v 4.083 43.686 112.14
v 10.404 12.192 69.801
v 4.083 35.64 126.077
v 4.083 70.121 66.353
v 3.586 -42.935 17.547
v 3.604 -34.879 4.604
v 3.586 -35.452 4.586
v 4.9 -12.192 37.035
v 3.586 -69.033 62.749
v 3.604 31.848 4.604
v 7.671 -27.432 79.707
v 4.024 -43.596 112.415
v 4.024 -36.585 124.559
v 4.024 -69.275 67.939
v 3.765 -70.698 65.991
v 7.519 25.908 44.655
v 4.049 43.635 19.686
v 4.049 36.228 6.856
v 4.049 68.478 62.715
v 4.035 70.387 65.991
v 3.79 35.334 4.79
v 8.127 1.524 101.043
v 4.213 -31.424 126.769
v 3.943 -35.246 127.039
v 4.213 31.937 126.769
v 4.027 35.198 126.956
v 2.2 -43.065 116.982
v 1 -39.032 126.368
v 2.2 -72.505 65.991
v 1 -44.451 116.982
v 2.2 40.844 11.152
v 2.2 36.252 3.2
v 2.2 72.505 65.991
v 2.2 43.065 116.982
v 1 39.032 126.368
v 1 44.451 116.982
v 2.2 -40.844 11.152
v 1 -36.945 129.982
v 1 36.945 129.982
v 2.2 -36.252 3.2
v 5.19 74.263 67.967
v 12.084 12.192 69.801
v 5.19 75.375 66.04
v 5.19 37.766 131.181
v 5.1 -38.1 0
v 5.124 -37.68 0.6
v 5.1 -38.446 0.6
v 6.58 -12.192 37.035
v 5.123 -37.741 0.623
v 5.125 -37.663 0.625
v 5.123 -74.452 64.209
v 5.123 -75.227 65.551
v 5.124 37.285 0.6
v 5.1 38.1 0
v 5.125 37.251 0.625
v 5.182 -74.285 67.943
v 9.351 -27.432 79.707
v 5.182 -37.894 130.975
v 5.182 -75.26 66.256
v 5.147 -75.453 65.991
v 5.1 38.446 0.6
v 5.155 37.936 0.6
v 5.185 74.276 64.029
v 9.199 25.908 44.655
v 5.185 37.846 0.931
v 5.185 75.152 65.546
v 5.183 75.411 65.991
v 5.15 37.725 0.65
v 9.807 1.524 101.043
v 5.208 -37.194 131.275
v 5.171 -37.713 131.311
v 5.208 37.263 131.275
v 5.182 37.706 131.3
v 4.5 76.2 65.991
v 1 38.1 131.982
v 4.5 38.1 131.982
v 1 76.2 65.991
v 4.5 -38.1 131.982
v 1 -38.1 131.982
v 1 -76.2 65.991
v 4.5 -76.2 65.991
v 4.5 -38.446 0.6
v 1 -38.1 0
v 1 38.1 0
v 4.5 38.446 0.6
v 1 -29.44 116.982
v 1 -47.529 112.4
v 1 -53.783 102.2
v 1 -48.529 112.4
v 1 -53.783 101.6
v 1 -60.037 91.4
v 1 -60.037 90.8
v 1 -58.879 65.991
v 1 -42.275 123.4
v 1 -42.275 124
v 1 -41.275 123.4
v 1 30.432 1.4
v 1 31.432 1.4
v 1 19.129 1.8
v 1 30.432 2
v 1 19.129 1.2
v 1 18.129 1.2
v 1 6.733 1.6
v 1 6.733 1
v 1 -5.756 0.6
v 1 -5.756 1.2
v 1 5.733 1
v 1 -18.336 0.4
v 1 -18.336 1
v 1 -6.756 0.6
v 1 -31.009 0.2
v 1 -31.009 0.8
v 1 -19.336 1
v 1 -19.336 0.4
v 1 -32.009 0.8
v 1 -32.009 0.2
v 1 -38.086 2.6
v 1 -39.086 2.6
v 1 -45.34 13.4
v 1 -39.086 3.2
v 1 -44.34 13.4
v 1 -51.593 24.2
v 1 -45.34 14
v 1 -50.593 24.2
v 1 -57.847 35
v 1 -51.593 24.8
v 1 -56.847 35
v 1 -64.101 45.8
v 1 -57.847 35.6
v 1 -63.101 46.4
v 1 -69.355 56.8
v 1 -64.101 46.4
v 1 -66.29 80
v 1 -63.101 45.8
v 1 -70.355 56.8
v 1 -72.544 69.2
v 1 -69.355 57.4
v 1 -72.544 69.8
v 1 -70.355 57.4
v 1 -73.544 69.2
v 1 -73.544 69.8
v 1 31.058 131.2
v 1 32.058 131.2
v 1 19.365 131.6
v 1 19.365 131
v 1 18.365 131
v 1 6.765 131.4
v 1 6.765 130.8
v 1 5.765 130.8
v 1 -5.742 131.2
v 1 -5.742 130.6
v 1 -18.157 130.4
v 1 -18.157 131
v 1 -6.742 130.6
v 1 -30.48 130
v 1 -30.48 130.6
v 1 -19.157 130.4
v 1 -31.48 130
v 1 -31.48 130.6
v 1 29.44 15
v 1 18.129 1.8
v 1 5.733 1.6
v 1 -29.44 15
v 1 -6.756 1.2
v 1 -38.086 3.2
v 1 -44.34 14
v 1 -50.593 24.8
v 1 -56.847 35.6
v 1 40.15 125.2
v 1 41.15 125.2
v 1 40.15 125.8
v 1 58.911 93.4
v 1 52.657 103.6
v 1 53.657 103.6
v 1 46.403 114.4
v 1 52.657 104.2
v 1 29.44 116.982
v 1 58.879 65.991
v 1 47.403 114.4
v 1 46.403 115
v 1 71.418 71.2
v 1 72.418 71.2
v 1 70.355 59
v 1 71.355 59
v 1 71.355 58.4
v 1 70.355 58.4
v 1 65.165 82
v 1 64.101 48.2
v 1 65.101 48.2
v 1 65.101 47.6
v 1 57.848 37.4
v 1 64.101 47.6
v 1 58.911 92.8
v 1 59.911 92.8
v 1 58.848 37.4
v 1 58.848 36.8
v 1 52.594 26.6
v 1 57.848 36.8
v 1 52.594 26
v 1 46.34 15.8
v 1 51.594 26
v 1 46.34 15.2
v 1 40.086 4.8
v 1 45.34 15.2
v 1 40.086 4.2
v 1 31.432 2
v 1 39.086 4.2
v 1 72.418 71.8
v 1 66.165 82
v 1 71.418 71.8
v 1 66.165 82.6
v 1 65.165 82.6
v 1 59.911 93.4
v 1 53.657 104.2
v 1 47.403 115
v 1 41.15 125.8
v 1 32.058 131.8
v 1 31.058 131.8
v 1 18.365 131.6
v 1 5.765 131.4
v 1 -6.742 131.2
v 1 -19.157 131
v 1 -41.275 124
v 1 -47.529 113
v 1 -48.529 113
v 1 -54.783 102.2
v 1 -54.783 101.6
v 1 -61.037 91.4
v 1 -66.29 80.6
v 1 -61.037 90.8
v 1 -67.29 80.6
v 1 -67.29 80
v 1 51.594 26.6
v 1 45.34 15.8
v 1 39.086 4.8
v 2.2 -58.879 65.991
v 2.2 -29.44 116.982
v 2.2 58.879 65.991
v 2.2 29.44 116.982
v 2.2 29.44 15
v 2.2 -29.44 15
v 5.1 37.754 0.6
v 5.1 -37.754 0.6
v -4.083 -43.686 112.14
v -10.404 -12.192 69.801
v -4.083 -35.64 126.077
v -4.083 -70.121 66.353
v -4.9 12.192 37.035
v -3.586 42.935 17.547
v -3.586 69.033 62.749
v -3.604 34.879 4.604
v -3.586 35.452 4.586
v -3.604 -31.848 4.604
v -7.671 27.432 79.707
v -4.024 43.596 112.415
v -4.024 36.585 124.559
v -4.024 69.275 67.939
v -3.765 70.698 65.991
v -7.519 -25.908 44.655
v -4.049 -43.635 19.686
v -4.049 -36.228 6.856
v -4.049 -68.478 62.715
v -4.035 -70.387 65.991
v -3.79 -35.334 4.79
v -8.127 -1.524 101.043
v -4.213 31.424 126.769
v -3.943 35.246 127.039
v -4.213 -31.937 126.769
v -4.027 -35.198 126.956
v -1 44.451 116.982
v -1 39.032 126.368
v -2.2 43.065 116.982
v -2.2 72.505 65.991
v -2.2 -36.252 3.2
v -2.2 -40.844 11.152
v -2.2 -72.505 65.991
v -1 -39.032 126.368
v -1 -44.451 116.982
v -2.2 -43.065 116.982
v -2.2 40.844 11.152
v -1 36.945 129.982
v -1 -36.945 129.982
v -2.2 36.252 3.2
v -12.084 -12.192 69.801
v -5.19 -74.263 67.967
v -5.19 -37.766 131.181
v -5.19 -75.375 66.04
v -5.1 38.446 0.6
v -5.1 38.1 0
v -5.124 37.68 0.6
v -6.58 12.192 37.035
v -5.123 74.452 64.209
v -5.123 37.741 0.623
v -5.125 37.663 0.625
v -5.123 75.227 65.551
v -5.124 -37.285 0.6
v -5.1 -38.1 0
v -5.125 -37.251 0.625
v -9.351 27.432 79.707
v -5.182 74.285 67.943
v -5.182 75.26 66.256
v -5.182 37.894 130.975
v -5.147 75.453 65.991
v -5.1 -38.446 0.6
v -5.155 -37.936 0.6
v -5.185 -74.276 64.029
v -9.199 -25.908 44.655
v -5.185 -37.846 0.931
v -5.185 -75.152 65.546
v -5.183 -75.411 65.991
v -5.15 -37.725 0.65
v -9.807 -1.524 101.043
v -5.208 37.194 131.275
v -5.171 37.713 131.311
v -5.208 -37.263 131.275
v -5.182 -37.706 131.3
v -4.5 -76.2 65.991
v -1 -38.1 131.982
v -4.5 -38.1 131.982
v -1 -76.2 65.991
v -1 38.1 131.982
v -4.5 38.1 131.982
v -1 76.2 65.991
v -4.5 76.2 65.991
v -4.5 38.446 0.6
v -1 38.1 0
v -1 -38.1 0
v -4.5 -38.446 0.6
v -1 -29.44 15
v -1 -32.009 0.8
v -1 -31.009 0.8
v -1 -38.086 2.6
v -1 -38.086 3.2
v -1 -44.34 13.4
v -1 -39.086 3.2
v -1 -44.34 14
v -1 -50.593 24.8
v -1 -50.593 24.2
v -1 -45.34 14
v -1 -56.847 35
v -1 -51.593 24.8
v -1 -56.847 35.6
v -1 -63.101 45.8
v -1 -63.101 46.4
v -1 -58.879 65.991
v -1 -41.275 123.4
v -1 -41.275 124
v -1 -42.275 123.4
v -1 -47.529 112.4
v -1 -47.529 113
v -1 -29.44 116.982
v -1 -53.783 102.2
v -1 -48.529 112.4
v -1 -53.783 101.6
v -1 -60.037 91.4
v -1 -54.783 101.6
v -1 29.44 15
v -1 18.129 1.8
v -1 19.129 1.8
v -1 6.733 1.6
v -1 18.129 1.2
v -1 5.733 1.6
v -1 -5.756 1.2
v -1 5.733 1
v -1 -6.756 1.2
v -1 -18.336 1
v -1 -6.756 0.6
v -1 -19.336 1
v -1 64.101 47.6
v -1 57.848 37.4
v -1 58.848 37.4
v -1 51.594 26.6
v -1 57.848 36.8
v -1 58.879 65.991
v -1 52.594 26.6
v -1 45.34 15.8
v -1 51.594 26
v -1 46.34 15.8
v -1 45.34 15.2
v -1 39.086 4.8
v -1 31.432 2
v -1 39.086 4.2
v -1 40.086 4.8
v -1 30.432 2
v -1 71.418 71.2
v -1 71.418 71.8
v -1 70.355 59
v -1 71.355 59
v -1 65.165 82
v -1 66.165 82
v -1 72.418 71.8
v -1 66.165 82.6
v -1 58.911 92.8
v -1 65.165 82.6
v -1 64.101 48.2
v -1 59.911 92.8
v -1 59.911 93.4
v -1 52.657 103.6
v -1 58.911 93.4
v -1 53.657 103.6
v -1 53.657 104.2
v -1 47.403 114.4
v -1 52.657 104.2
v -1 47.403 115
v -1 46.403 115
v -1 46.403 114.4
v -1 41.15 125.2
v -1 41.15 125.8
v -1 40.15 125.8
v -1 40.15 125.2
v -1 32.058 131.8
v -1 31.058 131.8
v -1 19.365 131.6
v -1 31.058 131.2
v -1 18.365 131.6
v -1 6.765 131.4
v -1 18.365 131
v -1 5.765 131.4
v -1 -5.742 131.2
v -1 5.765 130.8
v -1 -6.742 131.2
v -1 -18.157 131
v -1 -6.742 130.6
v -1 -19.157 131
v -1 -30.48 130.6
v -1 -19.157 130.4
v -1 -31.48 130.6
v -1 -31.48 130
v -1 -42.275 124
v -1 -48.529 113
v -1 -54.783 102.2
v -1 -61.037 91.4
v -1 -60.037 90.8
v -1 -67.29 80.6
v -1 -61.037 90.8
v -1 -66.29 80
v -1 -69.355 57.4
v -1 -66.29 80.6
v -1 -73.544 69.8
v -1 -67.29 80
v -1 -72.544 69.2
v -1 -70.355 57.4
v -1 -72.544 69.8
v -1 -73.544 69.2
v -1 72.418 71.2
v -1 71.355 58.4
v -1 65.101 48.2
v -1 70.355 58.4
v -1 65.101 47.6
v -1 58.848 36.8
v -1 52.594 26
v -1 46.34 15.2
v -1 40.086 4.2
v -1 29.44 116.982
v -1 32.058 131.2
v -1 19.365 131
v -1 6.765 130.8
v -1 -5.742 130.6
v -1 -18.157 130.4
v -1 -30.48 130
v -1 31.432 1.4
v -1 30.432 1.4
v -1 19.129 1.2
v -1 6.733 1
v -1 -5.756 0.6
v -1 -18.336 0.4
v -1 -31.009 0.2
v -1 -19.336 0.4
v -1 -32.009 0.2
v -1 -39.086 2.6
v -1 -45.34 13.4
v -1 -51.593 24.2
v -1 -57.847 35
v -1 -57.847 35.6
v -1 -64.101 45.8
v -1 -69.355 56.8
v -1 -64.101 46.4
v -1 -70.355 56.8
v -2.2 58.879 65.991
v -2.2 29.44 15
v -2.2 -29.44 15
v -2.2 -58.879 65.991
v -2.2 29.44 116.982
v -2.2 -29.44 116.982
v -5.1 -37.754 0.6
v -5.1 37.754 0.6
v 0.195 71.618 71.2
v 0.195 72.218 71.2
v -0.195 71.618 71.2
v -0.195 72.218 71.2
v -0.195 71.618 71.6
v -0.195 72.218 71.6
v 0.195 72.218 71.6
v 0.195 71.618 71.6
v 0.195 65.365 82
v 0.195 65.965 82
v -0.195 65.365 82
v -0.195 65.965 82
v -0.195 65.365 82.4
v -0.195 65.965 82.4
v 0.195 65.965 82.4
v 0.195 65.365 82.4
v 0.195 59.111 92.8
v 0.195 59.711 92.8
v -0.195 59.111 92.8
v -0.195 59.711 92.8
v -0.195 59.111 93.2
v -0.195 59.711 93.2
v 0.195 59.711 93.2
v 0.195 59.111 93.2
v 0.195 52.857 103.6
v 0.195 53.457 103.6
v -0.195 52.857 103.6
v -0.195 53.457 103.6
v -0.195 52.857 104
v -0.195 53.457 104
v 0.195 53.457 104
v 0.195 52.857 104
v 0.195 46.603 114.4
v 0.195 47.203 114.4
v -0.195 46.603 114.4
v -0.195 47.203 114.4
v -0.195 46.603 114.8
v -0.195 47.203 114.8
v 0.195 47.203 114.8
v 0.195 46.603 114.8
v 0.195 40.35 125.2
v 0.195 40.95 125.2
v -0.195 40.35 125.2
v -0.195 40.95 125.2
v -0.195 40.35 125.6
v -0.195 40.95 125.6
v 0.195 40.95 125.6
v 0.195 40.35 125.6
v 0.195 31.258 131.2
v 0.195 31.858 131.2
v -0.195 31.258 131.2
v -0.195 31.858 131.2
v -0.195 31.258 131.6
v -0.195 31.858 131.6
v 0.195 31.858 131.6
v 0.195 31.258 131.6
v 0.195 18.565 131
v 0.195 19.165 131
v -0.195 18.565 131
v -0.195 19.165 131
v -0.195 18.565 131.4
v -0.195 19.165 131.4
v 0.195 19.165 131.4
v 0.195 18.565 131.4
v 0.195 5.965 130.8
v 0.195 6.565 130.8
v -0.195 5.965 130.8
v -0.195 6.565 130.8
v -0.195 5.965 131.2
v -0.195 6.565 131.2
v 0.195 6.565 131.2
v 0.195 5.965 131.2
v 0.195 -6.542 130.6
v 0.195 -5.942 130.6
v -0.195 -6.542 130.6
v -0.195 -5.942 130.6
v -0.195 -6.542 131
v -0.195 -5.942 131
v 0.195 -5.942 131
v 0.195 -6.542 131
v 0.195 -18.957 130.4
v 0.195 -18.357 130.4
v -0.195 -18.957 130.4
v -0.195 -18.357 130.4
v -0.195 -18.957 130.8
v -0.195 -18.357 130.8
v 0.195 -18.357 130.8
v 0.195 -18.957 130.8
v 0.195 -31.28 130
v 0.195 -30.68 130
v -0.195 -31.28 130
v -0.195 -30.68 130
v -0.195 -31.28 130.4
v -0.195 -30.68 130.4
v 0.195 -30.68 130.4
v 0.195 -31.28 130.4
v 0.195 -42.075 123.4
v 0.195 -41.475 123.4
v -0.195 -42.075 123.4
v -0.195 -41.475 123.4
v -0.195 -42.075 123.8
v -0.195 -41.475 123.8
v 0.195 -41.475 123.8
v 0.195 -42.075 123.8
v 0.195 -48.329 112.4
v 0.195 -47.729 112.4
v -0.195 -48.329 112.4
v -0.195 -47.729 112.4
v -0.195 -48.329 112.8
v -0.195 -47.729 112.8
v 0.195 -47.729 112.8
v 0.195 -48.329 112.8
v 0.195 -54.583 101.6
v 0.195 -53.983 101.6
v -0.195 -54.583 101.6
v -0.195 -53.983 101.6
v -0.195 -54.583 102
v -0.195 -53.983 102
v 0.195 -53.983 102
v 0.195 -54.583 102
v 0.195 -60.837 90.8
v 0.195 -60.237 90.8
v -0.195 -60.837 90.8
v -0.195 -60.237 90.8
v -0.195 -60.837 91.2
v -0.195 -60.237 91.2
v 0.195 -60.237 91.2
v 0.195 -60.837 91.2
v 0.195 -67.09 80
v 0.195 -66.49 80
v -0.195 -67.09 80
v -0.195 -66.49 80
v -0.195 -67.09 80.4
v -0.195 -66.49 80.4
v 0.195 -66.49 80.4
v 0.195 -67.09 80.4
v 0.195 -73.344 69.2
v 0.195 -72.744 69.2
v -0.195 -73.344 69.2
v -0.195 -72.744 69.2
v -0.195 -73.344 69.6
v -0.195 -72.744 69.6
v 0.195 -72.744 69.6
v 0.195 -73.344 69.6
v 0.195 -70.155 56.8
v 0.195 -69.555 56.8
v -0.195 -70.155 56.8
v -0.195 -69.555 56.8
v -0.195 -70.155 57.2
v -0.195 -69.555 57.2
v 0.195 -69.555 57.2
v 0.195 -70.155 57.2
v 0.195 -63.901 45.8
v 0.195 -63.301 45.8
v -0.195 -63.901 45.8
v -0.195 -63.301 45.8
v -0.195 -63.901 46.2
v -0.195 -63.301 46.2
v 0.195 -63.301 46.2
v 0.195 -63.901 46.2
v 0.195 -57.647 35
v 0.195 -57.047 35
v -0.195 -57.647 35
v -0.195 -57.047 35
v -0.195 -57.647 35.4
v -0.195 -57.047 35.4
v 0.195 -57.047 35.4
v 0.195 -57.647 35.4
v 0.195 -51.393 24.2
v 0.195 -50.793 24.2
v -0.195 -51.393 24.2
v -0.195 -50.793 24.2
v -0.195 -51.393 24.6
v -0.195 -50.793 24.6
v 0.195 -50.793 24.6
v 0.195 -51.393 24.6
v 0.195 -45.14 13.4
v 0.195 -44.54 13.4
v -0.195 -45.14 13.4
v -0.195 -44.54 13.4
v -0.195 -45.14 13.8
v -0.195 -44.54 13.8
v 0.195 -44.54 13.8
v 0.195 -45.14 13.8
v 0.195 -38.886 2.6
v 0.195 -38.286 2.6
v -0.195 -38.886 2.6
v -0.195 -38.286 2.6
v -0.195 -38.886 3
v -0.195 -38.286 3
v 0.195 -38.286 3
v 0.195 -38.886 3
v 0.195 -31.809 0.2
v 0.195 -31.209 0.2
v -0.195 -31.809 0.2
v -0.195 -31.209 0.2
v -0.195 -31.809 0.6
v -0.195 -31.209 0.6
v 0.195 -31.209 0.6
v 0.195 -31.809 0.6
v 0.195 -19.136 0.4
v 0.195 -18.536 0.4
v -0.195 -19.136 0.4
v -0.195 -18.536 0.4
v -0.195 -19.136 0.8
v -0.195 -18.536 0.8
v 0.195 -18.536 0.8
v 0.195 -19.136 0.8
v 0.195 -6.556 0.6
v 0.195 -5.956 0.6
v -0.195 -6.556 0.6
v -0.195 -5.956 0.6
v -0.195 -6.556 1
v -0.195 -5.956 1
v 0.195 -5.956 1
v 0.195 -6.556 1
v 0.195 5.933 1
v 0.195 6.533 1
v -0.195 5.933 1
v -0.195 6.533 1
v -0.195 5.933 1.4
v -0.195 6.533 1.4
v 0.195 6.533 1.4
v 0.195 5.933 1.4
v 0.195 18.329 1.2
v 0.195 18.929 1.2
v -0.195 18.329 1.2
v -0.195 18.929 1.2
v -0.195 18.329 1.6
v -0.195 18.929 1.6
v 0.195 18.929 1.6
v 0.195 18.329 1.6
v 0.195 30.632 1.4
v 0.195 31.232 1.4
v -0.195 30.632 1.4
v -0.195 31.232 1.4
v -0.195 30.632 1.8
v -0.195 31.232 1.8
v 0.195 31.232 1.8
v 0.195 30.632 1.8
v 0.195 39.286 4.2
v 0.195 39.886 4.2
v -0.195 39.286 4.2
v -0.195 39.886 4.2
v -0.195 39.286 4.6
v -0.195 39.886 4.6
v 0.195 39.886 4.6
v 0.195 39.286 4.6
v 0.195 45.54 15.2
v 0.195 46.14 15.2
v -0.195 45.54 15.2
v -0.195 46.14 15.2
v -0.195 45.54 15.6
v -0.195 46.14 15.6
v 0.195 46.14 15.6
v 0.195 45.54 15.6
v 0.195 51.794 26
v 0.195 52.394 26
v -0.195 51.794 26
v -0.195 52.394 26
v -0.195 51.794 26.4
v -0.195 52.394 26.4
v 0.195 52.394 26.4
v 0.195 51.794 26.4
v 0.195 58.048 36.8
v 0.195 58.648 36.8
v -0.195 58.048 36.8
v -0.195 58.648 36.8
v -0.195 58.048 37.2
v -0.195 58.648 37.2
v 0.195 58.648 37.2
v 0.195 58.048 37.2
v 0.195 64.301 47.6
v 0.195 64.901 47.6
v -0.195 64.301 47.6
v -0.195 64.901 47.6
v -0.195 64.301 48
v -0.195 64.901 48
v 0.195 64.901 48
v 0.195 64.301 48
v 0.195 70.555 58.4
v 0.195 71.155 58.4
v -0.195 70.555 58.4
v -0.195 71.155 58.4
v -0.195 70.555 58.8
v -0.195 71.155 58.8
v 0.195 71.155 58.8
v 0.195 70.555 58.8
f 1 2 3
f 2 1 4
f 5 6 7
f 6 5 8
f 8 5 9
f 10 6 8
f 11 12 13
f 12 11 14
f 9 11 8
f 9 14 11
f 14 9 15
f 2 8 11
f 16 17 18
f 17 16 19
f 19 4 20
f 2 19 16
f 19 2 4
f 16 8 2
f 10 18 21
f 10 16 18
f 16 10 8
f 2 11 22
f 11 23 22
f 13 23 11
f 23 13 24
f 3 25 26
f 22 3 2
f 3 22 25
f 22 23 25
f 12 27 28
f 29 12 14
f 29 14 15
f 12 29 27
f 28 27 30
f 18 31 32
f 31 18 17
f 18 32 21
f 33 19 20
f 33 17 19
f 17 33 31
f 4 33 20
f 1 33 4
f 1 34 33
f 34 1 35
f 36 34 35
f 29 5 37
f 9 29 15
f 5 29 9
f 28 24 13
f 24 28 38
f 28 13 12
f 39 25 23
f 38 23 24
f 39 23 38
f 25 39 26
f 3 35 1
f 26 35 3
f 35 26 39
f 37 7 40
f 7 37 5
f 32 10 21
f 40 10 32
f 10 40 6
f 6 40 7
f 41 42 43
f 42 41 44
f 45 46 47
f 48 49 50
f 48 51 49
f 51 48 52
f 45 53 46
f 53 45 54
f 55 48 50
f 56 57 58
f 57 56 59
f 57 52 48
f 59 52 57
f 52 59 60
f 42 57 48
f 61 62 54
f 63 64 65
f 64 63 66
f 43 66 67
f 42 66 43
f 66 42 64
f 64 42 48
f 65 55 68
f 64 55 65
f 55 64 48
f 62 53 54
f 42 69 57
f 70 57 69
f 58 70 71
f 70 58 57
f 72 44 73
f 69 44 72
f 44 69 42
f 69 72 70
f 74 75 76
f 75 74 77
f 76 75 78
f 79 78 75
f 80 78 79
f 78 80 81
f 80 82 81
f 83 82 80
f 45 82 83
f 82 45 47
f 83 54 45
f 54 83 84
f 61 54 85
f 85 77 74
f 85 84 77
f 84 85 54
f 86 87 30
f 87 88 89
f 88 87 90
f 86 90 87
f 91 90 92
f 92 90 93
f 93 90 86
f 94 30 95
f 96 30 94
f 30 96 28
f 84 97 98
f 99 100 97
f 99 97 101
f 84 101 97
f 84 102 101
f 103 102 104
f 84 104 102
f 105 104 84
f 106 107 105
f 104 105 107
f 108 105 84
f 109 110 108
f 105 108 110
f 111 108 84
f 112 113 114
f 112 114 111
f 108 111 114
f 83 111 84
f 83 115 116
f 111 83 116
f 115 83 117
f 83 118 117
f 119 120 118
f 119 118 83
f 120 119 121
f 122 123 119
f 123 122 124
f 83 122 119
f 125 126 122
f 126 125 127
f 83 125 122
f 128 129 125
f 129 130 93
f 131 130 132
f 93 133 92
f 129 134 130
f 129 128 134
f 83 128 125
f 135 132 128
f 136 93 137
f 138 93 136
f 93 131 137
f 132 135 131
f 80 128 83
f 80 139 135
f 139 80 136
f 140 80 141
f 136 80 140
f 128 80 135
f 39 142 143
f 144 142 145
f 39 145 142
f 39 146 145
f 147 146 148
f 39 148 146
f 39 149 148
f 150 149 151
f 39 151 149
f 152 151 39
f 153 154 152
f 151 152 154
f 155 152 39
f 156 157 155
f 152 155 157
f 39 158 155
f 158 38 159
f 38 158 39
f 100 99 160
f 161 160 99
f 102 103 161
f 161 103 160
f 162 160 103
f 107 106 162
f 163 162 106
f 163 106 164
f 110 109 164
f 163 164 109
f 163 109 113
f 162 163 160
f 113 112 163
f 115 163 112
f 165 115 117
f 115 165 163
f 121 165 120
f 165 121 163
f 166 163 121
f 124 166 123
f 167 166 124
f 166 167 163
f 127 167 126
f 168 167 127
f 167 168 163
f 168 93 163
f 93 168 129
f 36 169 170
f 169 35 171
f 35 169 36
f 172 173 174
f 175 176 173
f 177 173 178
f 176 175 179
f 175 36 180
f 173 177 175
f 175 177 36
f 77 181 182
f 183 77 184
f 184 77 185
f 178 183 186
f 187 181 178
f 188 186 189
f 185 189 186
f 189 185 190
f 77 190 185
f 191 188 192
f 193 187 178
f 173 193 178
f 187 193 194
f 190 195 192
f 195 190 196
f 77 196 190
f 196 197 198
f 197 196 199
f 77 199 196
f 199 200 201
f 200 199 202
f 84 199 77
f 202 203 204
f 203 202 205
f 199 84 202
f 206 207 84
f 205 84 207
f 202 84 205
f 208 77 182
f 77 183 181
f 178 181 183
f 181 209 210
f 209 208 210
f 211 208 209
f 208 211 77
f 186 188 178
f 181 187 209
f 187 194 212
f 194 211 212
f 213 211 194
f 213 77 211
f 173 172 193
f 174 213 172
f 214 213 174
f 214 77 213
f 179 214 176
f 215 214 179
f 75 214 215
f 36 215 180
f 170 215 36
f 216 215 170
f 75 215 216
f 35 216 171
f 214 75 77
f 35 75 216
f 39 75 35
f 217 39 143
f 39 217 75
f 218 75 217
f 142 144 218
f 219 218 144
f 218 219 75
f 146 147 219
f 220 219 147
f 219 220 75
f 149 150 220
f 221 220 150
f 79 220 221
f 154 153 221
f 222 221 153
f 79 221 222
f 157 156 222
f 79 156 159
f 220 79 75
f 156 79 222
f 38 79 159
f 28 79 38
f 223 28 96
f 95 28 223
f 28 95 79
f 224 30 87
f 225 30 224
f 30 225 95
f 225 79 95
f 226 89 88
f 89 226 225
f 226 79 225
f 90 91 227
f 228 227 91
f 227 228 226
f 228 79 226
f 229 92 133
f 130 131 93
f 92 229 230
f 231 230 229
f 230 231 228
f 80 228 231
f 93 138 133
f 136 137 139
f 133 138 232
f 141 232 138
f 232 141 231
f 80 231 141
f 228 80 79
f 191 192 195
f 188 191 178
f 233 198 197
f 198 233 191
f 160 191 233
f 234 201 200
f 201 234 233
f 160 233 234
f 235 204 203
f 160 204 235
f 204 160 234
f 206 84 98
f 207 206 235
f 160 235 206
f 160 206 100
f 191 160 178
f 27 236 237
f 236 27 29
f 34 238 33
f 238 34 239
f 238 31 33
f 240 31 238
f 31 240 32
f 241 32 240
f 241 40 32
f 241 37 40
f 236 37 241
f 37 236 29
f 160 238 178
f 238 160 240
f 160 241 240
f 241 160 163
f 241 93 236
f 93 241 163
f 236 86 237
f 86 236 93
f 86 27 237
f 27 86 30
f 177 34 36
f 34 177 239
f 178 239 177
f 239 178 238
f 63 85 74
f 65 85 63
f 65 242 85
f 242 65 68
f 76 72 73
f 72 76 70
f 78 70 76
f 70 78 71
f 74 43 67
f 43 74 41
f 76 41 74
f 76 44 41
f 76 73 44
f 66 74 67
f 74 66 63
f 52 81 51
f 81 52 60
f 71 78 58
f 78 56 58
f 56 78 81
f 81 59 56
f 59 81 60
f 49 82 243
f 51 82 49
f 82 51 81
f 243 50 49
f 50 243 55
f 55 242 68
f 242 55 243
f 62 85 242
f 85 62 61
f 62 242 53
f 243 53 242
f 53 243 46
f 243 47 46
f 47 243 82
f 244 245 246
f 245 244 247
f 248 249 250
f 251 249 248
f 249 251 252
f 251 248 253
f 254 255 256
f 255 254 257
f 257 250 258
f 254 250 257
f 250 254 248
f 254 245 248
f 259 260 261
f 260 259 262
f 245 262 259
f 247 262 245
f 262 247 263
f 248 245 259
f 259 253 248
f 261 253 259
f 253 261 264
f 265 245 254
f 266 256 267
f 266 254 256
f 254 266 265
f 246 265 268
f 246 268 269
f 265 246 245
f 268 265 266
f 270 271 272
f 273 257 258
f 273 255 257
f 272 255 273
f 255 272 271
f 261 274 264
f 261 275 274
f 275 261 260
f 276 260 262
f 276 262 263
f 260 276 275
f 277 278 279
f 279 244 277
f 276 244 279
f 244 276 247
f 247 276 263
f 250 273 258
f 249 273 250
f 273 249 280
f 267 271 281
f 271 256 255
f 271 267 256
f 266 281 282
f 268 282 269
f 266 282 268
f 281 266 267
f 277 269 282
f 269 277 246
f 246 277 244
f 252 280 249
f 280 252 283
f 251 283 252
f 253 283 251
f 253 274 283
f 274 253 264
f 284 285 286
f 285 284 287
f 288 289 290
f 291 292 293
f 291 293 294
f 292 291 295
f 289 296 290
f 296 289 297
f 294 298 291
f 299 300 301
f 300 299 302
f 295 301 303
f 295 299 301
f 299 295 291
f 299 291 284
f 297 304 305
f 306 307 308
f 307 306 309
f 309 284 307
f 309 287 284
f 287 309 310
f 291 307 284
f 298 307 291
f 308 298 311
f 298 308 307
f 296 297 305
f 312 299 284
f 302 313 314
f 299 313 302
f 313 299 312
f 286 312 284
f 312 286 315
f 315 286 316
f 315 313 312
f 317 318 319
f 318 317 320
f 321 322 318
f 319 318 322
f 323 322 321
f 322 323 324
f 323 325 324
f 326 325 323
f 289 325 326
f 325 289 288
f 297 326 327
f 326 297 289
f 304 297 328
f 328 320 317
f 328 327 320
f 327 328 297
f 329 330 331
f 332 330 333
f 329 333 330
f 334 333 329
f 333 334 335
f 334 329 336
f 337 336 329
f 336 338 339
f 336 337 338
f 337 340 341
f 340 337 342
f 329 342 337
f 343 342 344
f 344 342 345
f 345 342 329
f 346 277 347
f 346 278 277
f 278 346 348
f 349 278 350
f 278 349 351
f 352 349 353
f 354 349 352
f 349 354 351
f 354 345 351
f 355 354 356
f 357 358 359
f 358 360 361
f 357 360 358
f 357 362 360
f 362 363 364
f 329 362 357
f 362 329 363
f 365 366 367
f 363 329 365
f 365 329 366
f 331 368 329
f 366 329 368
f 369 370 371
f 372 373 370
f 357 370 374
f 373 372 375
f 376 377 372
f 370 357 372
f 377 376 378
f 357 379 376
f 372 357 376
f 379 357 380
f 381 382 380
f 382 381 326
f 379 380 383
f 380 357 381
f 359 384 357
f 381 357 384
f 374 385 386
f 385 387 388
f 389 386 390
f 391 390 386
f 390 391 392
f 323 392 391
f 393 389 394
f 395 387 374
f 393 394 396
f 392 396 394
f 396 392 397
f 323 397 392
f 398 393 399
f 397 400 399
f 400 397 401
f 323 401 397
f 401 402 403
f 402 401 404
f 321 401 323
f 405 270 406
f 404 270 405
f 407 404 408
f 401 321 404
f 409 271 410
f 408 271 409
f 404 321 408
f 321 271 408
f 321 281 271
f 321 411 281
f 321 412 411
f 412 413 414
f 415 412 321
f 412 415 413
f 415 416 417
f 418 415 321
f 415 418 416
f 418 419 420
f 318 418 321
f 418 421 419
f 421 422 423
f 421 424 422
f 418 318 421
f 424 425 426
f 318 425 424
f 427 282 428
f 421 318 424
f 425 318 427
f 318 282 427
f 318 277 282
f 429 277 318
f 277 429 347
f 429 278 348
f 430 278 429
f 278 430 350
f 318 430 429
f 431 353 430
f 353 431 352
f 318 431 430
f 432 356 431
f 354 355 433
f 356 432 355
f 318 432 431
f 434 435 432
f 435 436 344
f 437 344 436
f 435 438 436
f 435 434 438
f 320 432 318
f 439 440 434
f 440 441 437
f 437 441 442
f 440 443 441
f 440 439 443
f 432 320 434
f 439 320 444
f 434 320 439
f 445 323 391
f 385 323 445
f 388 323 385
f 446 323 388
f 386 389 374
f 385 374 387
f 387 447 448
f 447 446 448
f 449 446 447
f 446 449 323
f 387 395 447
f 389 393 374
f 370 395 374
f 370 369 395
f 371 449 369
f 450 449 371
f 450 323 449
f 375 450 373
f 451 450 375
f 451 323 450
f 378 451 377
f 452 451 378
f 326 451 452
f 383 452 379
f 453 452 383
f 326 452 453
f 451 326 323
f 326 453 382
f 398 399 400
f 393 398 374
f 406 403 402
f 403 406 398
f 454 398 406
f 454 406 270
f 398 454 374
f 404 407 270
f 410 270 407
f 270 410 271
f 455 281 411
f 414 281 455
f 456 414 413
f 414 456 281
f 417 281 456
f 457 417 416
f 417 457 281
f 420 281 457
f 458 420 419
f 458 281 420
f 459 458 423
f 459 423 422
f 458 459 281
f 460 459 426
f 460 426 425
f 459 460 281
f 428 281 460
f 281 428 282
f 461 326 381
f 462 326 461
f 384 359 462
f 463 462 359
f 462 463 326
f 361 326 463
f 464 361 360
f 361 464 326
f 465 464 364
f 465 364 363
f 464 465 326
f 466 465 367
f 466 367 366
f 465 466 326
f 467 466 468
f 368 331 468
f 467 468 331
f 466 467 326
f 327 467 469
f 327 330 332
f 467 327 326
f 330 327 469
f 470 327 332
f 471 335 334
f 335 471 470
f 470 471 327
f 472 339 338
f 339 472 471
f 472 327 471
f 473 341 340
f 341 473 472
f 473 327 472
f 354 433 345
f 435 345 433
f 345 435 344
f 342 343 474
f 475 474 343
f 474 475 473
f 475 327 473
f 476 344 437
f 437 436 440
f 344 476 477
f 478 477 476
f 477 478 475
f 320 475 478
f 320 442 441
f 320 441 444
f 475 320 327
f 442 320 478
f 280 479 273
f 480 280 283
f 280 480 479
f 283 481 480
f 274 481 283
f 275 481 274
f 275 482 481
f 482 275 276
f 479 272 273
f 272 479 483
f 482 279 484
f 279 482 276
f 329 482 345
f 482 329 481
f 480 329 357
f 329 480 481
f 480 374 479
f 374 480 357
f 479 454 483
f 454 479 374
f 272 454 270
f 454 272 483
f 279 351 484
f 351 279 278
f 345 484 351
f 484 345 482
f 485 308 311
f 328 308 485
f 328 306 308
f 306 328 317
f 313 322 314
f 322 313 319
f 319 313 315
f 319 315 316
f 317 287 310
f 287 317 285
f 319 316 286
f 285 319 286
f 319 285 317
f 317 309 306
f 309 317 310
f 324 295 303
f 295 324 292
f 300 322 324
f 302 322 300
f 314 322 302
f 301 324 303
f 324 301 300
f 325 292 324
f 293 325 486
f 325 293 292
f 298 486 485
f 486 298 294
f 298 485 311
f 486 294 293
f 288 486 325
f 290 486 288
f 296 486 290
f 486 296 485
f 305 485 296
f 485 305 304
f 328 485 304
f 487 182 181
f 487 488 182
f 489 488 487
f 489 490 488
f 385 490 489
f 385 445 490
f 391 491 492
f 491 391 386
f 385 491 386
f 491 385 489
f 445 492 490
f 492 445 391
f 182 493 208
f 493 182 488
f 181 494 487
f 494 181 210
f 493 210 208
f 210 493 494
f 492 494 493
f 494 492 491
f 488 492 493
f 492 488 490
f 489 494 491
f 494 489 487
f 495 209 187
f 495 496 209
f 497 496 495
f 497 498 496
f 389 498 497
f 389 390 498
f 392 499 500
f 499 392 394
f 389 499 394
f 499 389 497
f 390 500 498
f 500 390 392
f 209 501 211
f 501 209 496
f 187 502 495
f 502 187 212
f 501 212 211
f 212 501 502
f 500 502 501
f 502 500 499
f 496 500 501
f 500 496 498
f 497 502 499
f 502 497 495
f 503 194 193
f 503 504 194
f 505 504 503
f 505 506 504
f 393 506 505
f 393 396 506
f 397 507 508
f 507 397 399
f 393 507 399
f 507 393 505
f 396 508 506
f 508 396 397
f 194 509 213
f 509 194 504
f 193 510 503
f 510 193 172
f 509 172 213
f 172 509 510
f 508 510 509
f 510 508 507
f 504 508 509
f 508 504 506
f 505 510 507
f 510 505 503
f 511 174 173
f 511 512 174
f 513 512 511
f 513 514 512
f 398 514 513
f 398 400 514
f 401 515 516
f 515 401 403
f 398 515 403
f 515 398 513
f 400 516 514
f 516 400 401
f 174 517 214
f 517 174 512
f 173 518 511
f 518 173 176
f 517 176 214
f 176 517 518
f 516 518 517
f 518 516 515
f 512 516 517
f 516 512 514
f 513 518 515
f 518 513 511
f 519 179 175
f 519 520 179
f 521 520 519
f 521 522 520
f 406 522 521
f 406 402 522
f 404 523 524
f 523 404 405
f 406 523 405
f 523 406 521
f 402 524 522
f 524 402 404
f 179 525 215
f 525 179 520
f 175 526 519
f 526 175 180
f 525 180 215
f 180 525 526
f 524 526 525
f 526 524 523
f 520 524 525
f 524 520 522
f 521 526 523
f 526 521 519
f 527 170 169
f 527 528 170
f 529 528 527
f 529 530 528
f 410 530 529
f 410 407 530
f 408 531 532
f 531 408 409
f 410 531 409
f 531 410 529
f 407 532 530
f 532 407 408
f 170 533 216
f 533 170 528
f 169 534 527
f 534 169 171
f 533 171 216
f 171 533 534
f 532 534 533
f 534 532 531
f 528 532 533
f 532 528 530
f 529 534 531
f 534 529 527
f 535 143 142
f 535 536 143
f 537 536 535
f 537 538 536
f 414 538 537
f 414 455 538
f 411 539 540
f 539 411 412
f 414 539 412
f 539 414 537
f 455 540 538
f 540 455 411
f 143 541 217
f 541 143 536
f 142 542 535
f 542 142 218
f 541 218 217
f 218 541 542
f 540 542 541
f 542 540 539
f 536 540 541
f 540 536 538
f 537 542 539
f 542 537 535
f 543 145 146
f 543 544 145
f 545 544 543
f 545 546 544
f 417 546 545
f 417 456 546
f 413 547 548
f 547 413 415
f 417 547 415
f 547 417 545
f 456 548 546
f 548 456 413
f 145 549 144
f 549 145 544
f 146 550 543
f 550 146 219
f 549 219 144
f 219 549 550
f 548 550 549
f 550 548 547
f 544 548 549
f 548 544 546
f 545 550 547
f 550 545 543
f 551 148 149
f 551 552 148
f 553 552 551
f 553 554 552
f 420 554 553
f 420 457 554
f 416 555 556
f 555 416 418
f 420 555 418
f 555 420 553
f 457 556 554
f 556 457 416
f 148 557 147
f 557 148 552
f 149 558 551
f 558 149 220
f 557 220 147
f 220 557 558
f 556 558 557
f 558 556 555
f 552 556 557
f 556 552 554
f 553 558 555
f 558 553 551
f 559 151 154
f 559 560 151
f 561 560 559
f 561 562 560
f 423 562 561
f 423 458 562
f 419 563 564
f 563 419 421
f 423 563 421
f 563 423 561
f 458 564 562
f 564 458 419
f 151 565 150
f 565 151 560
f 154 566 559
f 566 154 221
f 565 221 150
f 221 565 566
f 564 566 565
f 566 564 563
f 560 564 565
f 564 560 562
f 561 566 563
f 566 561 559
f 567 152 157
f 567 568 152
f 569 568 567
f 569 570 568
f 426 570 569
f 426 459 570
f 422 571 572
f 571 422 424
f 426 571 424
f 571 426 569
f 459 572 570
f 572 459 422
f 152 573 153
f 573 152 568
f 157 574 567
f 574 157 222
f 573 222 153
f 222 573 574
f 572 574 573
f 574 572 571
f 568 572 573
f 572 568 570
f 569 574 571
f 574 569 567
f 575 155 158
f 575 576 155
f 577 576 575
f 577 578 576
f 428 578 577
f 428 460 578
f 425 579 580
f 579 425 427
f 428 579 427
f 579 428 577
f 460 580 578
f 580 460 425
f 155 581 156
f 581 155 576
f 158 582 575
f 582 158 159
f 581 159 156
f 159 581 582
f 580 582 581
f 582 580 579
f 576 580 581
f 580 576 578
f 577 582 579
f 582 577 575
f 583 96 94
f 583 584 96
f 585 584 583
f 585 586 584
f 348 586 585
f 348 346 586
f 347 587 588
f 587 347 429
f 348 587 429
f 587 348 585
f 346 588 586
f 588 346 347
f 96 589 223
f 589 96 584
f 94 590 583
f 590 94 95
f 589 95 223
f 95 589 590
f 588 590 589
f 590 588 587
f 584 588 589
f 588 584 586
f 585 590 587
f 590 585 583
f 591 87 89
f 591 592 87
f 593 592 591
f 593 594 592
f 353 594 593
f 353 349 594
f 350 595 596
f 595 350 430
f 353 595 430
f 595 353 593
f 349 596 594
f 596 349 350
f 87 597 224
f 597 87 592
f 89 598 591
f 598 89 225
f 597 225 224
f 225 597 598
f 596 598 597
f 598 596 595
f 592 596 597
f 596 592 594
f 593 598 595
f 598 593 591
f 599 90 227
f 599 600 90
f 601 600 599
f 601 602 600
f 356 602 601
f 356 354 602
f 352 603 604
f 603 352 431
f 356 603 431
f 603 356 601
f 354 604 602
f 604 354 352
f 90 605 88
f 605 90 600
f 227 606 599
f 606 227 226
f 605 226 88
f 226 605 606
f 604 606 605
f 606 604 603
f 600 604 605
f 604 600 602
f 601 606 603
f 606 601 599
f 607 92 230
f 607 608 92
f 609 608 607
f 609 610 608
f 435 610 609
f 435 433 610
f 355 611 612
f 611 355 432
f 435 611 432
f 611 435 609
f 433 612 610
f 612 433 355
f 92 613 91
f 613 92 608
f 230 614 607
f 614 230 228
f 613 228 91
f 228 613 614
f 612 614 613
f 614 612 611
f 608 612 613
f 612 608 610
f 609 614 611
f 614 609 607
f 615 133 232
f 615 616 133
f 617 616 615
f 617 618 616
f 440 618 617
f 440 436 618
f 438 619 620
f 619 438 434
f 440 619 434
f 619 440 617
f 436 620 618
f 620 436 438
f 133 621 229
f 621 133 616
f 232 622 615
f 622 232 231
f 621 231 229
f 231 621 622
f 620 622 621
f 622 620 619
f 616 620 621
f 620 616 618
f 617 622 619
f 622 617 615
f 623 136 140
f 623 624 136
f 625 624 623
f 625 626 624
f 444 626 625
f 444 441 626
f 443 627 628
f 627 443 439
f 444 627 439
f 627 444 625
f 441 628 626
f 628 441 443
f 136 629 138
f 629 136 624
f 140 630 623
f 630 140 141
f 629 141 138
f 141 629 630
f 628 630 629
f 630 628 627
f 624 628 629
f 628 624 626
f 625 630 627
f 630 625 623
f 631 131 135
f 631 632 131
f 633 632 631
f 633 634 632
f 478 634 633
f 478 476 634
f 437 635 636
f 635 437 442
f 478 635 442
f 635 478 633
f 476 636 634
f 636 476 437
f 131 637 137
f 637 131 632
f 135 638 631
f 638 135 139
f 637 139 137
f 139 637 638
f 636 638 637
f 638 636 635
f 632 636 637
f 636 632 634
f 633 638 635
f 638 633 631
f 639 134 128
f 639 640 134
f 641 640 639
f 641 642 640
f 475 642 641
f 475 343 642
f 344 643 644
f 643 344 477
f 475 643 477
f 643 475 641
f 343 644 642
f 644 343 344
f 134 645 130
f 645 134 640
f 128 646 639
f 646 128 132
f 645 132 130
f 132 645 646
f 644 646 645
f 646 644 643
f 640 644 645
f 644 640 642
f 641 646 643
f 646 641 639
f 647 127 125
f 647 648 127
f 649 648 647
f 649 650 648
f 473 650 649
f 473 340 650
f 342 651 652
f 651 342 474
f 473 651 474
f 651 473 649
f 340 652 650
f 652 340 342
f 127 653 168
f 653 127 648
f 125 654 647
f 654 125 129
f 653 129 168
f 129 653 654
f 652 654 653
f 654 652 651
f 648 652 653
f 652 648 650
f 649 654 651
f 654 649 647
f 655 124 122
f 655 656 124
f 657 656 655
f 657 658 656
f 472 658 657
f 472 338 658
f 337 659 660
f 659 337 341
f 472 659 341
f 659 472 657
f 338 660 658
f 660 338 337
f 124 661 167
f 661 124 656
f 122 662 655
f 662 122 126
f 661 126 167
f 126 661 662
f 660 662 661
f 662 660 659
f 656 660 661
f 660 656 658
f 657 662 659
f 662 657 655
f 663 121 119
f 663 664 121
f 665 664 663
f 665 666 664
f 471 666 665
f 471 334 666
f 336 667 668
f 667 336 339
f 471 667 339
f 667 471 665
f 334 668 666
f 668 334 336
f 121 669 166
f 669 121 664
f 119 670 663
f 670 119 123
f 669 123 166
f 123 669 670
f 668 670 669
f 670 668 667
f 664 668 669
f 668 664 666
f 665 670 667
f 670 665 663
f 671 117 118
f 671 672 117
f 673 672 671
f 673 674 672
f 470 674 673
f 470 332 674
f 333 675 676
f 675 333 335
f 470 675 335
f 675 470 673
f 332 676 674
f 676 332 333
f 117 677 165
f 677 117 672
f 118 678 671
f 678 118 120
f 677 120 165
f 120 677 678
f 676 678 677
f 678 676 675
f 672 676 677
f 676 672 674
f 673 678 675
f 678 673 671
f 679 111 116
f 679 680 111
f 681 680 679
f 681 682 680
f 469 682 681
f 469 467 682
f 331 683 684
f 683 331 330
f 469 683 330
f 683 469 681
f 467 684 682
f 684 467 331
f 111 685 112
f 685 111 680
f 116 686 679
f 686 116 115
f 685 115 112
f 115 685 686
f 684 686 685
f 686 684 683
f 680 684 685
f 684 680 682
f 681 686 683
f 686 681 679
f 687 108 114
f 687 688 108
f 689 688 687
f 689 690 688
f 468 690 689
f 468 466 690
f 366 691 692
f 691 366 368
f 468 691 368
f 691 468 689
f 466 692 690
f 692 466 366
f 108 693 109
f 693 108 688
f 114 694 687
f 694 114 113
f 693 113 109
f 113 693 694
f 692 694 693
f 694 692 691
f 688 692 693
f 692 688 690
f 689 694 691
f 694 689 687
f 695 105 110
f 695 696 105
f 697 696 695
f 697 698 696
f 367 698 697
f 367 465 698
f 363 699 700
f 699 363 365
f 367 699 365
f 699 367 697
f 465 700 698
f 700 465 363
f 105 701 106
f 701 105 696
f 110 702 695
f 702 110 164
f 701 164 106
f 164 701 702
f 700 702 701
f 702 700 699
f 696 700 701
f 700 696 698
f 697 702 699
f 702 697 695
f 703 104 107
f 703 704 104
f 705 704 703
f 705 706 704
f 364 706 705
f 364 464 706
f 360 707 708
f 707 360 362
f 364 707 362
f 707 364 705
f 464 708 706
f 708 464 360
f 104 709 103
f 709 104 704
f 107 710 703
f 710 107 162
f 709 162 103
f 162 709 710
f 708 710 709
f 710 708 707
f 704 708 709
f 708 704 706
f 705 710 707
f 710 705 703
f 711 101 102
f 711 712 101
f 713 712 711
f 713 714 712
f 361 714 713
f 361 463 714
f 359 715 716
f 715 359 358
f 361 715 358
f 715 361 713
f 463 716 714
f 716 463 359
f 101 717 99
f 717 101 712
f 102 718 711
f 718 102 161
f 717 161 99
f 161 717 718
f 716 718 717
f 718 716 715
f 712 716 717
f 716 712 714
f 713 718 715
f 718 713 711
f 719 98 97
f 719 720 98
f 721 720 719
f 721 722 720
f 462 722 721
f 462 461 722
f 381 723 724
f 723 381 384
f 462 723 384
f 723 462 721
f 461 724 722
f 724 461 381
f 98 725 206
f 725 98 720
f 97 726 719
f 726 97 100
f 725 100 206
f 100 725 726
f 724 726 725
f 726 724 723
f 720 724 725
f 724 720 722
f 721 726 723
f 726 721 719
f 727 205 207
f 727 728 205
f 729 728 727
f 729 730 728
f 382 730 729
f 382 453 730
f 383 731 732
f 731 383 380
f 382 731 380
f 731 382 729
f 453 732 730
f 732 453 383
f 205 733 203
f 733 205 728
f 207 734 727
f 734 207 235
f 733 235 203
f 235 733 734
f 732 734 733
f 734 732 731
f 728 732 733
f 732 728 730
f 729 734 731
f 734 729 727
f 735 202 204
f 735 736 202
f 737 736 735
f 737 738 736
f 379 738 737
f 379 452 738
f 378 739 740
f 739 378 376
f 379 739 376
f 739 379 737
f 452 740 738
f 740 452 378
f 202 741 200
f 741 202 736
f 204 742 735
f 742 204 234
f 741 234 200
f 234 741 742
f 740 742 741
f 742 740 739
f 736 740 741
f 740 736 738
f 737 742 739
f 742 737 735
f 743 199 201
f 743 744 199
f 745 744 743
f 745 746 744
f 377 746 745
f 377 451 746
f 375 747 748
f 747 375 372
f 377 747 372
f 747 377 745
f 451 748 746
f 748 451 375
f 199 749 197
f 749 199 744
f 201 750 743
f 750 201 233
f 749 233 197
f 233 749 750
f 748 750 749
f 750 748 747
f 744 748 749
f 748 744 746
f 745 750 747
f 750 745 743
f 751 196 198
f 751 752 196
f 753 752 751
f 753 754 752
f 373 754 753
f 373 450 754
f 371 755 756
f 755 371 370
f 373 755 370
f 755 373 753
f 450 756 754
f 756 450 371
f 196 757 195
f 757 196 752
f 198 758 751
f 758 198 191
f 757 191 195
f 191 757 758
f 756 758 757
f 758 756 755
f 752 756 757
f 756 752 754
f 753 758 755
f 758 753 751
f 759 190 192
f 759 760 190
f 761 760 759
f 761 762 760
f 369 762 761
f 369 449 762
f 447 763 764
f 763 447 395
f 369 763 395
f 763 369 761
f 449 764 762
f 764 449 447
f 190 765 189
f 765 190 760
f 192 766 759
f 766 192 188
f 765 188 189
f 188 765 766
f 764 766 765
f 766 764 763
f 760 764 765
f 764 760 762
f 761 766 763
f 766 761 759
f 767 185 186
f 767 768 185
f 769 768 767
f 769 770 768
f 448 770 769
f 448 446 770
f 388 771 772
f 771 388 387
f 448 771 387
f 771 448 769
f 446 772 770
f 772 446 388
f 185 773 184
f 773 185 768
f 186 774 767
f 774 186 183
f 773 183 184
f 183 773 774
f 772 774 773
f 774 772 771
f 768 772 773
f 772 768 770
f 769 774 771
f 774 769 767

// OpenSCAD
/* HEX TILE v75 — reviewed native parametric OpenSCAD; millimetres.
   Standalone: no imports, missing modules, embedded STL or fused base rail.
   Default is ONE 6-inch candidate pair. 'chain' lays out independent pairs.
   F5 = preview. F6 = render; then File > Export > STL.
   Cut center necks before separating. Do not twist, peel or pry tile faces.
   Geometry checks cannot certify clean release, finish or print stability.
   OpenSCAD 2026.10.11 + Manifold tested; slicer remains authoritative.
*/

/* [Output] */
output = "pair"; // [pair, chain, wall, flat, separated, tabs, section, release_test]
inspection_spacing = 18;
show_markers = false; // Preview only; excluded from exported geometry.

/* [Tile geometry] */
size_in = 6;
edge_depth = 4.1;
rim = 2.0;
skin = 1.68; // v73: was 1.2 (v70–v72); 1.7 trips the clearance assert by float rounding. Vertical offset of faceted surface; not normal wall thickness.
relief_scale = 1.0;
front_chamfer = 0.6; // v73: back to v70 (v72 had 0.15, chip-prone edge).
// v74: leave the bed edge square. v73's 0.6 chamfer there undercut the first layer
// (9.0 mm footprint vs 10.4 mm just above); four upright prints tore off above the brim.
chamfer_bed_edge = false;
back_edge_chamfer = 0; // Maximize flat mounting surface; optional small bevel.
/* [Open back and wall-mounting flange] */
back_ring_width = 15;    // Wide enough for ~1/2 in (12.7 mm) foam tape with placement margin.
back_ring_t = 1.2;

// Keep the broad horizontal top flange omitted for upright printing.
// The other five continuous flange segments remain supported as they grow.
include_top_flange = false;
minimum_front_clearance = 1.2;

/* [Cuttable connections] */
pair_gap = 2.0;
root_width = 1.0;
root_height = 0.6;
root_overlap = 0.30; // Embed into flange, not a prediction of residual stub height.
neck_width = 0.60;
neck_height = 0.40;
neck_length = 0.40;
tab_pitch = 13; // v75: was 12 (7 tacks/side, 42/pair); 13 gives 6/side, 36/pair. Owner: "hard to seperate".

/* [Layer checks — match slicer] */
layer_height = 0.20;
first_layer_height = 0.20;
line_width = 0.42; // Check only; SCAD cannot set slicer extrusion width/nozzle.
enforce_event_limits = true;
root_event_limit = 2;       // Per-pair root transition cap.
all_event_limit = 3;        // Per-pair root + neck transition cap.

// Preserve the proven v70 three-pair chain while making its aggregate
// transition budget explicit. Lower these if slicer testing supports it.
enforce_batch_event_limits = true;
batch_root_event_limit = 6;
batch_all_event_limit = 9;

/* [Batch and bed — conservative rectangular check] */
chain_count = 3;
chain_gap = 6;
bed_width = 256;
bed_depth = 256;
bed_height = 256;
planned_brim = 10; // Used only in fit check; set brim separately in the slicer.
bed_margin = 5;

/* [Release sample — real lower rim, flange and front skin] */
sample_width = 24;
sample_height = 18;
sample_spacing = 10;

/* [Hidden] */
eps = 0.01;
R = size_in*25.4/2;
AP = R*cos(30);
relief_max = 0.091654*R*relief_scale;
front_max = edge_depth+relief_max;
D = front_max+1;
pair_width = 2*front_max+pair_gap;
N = max(2,ceil(R/tab_pitch));
lo = root_height/2+0.10;
hi = rim-root_height/2;
phase = [0,0,0.18,0.33,0,-0.17];
joined_mode = output=="pair" || output=="chain" || output=="section";
uses_tabs = joined_mode || output=="tabs";
integer_tolerance = 0.0001;

function dot2(a,b) = a[0]*b[0]+a[1]*b[1];
function lerp(a,b,t) = a+(b-a)*t;
function integer_value(x) = abs(x-round(x))<integer_tolerance;

function hex_point(s,inset) =
    let(rr=(AP-inset)/cos(30))
    [rr*cos(60*s),rr*sin(60*s)];

function inset_at(s,i) =
    s==1 ? lerp(lo,hi-0.1,i/(N-1)) :
    s==4 ? lerp(lo+0.1,hi,i/(N-1)) :
    rim/2;

function raw_center(s,i) =
    let(ins=inset_at(s,i),t=(i+0.5+phase[s])/N)
    lerp(hex_point(s,ins),hex_point(s+1,ins),t);

// Root bottom snaps to a BED-ALIGNED layer boundary.
// Its width coordinate remains unchanged.
function bed_layer_index(z) =
    floor((z-first_layer_height)/layer_height+0.5);

function layer_boundary(k) =
    first_layer_height+k*layer_height;

function tab_center(s,i) =
    let(
        p=raw_center(s,i),
        k=bed_layer_index(p[1]+AP-root_height/2)
    )
    [p[0],layer_boundary(k)+root_height/2-AP];

centers = [
    for(s=[0:5],i=[0:N-1])
        tab_center(s,i)
];

function root_bottom_layer(p) =
    bed_layer_index(p[1]+AP-root_height/2);

root_layers = round(root_height/layer_height);
neck_layers = round(neck_height/layer_height);

root_events = [
    for(p=centers,d=[0,root_layers])
        root_bottom_layer(p)+d
];

// Count each distinct transition once per join:
// root start, neck end, root end.
all_events =
    neck_layers==root_layers
    ? root_events
    : [
        for(p=centers,d=[0,neck_layers,root_layers])
            root_bottom_layer(p)+d
    ];

function event_peak(events) =
    max([
        for(k=events)
            len([for(e=events) if(e==k) 1])
    ]);

root_peak = event_peak(root_events);
all_peak = event_peak(all_events);

// For chain output, all independent pairs are aligned and therefore
// transition on the same bed layers. Enforce limits against the full batch.
effective_root_peak = output=="chain" ? root_peak*chain_count : root_peak;
effective_all_peak = output=="chain" ? all_peak*chain_count : all_peak;

within_side_pitch = max([
    for(s=[0:5],i=[0:N-2])
        norm(tab_center(s,i+1)-tab_center(s,i))
]);

corner_pitch = max([
    for(s=[0:5])
        norm(tab_center((s+1)%6,0)-tab_center(s,N-1))
]);

actual_pitch = max(within_side_pitch,corner_pitch);

function rim_distance(p) =
    AP-max([
        for(s=[0:5])
            dot2(p,[cos(30+60*s),sin(30+60*s)])
    ]);

root_corners = [
    for(p=centers,dy=[-1,1],dz=[-1,1])
        p+[dy*root_width/2,dz*root_height/2]
];

root_outer_margin =
    min([for(p=root_corners) rim_distance(p)]);

root_inner_distance =
    max([for(p=root_corners) rim_distance(p)]);

/* Dimension and topology guards */

assert(
    size_in>=3 && size_in<=10,
    "Size must be 3–10 inches"
);

assert(
    edge_depth>0 && skin>0 && relief_scale>0,
    "Invalid body dimensions"
);

assert(
    rim>=1.5 && rim<AP/4,
    "Rim outside supported range"
);

assert(
    back_ring_t>0 &&
    back_ring_width>=0 &&
    back_ring_width<=AP/2,
    "Invalid flange"
);
assert(
    edge_depth-skin-back_ring_t>=minimum_front_clearance,
    "Flange too close to front skin"
);

assert(
    minimum_front_clearance>0,
    "Front clearance must be positive"
);

assert(
    front_chamfer>=0 &&
    front_chamfer<min(rim,edge_depth),
    "Invalid front chamfer"
);

assert(
    back_edge_chamfer>=0 &&
    back_edge_chamfer<min(rim,back_ring_t),
    "Invalid back bevel"
);

assert(
    layer_height>0 &&
    first_layer_height>0 &&
    line_width>0,
    "Invalid slicer check values"
);

assert(
    pair_gap>=1.5 && pair_gap<=3,
    "Pair gap must be 1.5–3 mm"
);

assert(
    root_height>0 &&
    root_height<=1 &&
    root_width>neck_width &&
    root_width<=1.2,
    "Invalid root"
);

assert(
    neck_width>=line_width &&
    neck_height>=layer_height &&
    neck_height<=root_height,
    "Unprintable neck dimensions"
);

assert(
    neck_length>0 && neck_length<pair_gap,
    "Neck must fit in gap"
);

assert(
    root_overlap>0 && root_overlap<back_ring_t,
    "Root overlap must fit flange thickness"
);

assert(
    integer_value(root_height/layer_height) &&
    integer_value(neck_height/layer_height),
    "Root/neck heights must be whole layers"
);

assert(
    tab_pitch>0 && hi>lo+0.1,
    "Invalid tab spacing or rim allowance"
);

assert(
    !uses_tabs || actual_pitch<=tab_pitch,
    "Actual tab spacing exceeds requested pitch"
);

assert(
    !uses_tabs ||
    (
        root_outer_margin>eps &&
        root_inner_distance<=rim+eps
    ),
    "A root extends outside the supported rim; revise dimensions"
);

assert(
    !joined_mode || back_ring_width>=rim,
    "Joined outputs require a supporting tape flange"
);

assert(
    !uses_tabs ||
    !enforce_event_limits ||
    (
        root_peak<=root_event_limit &&
        all_peak<=all_event_limit
    ),
    "Per-pair layer transition burst: adjust layout or deliberately revise limits"
);

assert(
    output!="chain" ||
    !enforce_batch_event_limits ||
    (
        effective_root_peak<=batch_root_event_limit &&
        effective_all_peak<=batch_all_event_limit
    ),
    "Whole-chain layer transition burst: reduce chain count or revise batch limits deliberately"
);

assert(
    integer_value(chain_count) &&
    chain_count>=1 &&
    chain_count<=8,
    "Batch count must be integer 1–8"
);

assert(
    chain_gap>0 && inspection_spacing>=0,
    "Invalid spacing"
);

assert(
    output!="release_test" ||
    (
        sample_width>=root_width+4 &&
        sample_width<R &&
        sample_height>8 &&
        sample_height<AP/2
    ),
    "Invalid sample dimensions"
);

assert(
    back_ring_width>=4 || output!="release_test",
    "Sample needs at least 4 mm tape flange"
);

assert(
    planned_brim>=0 &&
    bed_margin>=0 &&
    min(bed_width,bed_depth,bed_height)>0,
    "Invalid bed check"
);

assert(
    output=="pair" ||
    output=="chain" ||
    output=="wall" ||
    output=="flat" ||
    output=="separated" ||
    output=="tabs" ||
    output=="section" ||
    output=="release_test",
    "Unknown output"
);

/* Conservative layout bounds.
   Includes planned brim and margins.
   Does not model printer exclusion zones. */

layout_x =
    output=="chain"
        ? chain_count*pair_width+(chain_count-1)*chain_gap :
    output=="release_test"
        ? 3*pair_width+2*sample_spacing :
    output=="flat"
        ? 2*R :
    output=="wall"
        ? front_max :
    output=="separated"
        ? pair_width+inspection_spacing :
    pair_width;

layout_y =
    output=="release_test"
        ? sample_width :
    output=="flat"
        ? 2*AP :
    2*R;

layout_z =
    output=="release_test"
        ? sample_height :
    output=="flat"
        ? front_max :
    2*AP;

print_layout =
    output=="pair" ||
    output=="chain" ||
    output=="wall" ||
    output=="flat" ||
    output=="separated" ||
    output=="tabs" ||
    output=="section" ||
    output=="release_test";

assert(
    !print_layout ||
    (
        layout_x+2*(planned_brim+bed_margin)<=bed_width &&
        layout_y+2*(planned_brim+bed_margin)<=bed_depth &&
        layout_z<=bed_height
    ),
    "Layout plus brim/margin exceeds bed; resize or reduce batch count"
);

echo(str(
    "v72 | ",output,
    " | ",6*N," joins/pair",
    " | max actual pitch ",actual_pitch," mm"
));

echo(str(
    "BED-ALIGNED transitions: pair root=",root_peak,
    "; pair including neck=",all_peak,
    "; effective root=",effective_root_peak,
    "; effective including neck=",effective_all_peak
));

if(output=="chain")
    echo(str(
        "Chain contains ",chain_count,
        " independent pairs; aggregate caps root=",batch_root_event_limit,
        ", including neck=",batch_all_event_limit,"."
    ));

if(output=="flat")
    echo(
        "Flat mode is inspection/export only until support/bridging behavior is validated."
    );

if(include_top_flange)
    echo(
        "Full top flange enabled: inspect unsupported starts in the actual slice."
    );

echo(str(
    "Wall-mount flange: ",back_ring_width,
    " mm wide x ",back_ring_t,
    " mm thick on the printable five-edge perimeter; top flange omitted=",
    !include_top_flange
));

/* Native front geometry.
   Inherited v30/v57 low-poly facet topology.
   Coordinates are normalized to the corner radius. */

FP = [
    [ 1.00,  0.000000, 0.000000],
    [ 0.50,  0.866025, 0.000000],
    [-0.50,  0.866025, 0.000000],
    [-1.00,  0.000000, 0.000000],
    [-0.50, -0.866025, 0.000000],
    [ 0.50, -0.866025, 0.000000],
    [ 0.16,  0.050000, 0.091654],
    [-0.16, -0.380000, 0.019428],
    [-0.36,  0.180000, 0.055790],
    [ 0.34, -0.280000, 0.053795],
    [ 0.02,  0.460000, 0.061766]
];

FACES = [
    [0,6,1],
    [4,3,7],
    [5,4,7],
    [8,3,2],
    [7,3,8],
    [7,8,6],
    [5,9,0],
    [9,6,0],
    [9,7,6],
    [5,7,9],
    [6,8,10],
    [8,2,10],
    [6,10,1],
    [10,2,1],
    [1,12,11,0],
    [2,13,12,1],
    [3,14,13,2],
    [4,15,14,3],
    [5,16,15,4],
    [0,11,16,5],
    [11,12,13,14,15,16]
];

module hex2d(a) {
    circle(r=a/cos(30),$fn=6);
}

module faceted_solid(dz=0,zb=0) {
    polyhedron(
        points=concat(
            [
                for(p=FP)
                    [
                        p[0]*R,
                        p[1]*R,
                        edge_depth+p[2]*R*relief_scale+dz
                    ]
            ],
            [
                for(i=[0:5])
                    [FP[i][0]*R,FP[i][1]*R,zb]
            ]
        ),
        faces=FACES,
        convexity=12
    );
}

module cavity() {
    H = D+2;
    a = AP-rim+1;

    assert(
        a>H,
        "Size too small for requested cavity depth"
    );

    intersection() {
        faceted_solid(-skin,-1);

        translate([0,0,-1])
            linear_extrude(H,scale=(a-H)/a)
                hex2d(a);
    }
}

module front_envelope() {
    H = D+5;

    union() {
        translate([0,0,-eps])
            linear_extrude(
                edge_depth-front_chamfer+eps
            )
                hex2d(AP+eps);

        translate([0,0,edge_depth-front_chamfer])
            linear_extrude(
                H,
                scale=(AP-H)/AP
            )
                hex2d(AP);

        // Local -Y flat is the bed edge once upright (Z = local Y).
        if(!chamfer_bed_edge)
            translate([-R-1,-AP-1,-1])
                cube([2*R+2,1+front_chamfer,D+7]);
    }
}

// Keeps the interior while beveling the outside.
// Unlike v68, this does not subtract the center.
module back_envelope() {
    union() {
        linear_extrude(
            back_edge_chamfer,
            scale=AP/(AP-back_edge_chamfer)
        )
            hex2d(AP-back_edge_chamfer);

        translate([0,0,back_edge_chamfer])
            linear_extrude(D+1)
                hex2d(AP);
    }
}

module tape_flange() {
    if(back_ring_width>0)
        linear_extrude(back_ring_t)
            intersection() {
                difference() {
                    hex2d(AP);
                    hex2d(AP-back_ring_width);
                }

                // Preserve v70's proven open-top flange behavior for upright printing.
                if(!include_top_flange)
                    translate([-2*R,-2*AP])
                        square([
                            4*R,
                            3*AP-back_ring_width
                        ]);
            }
}

module tile() {
    intersection() {
        union() {
            difference() {
                faceted_solid();
                cavity();
            }

            tape_flange();
        }

        if(front_chamfer>0)
            front_envelope();
        else
            faceted_solid();

        if(back_edge_chamfer>0)
            back_envelope();
        else
            faceted_solid();
    }
}

// Canonical frame:
// X = depth, Y = tile width, Z = height.
// Back plane is X=0.
module oriented_tile() {
    multmatrix([
        [0,0,1,0],
        [1,0,0,0],
        [0,1,0,0],
        [0,0,0,1]
    ])
        tile();
}

module first_tile() {
    translate([pair_gap/2,0,0])
        oriented_tile();
}

module partner_tile() {
    rotate([0,0,180])
        first_tile();
}

module bodies() {
    first_tile();
    partner_tile();
}

module connection(h=neck_height) {
    assert(
        h>0 &&
        h<=root_height+integer_tolerance &&
        integer_value(h/layer_height),
        "Sample neck must fit the root in whole layers"
    );

    // Shared bottom plane.
    // The short arms taper toward the cuttable middle.
    bottom = -root_height/2;

    for(sign=[-1,1])
        hull() {
            translate([
                sign*(pair_gap/2+root_overlap/2),
                0,
                bottom+root_height/2
            ])
                cube([
                    root_overlap,
                    root_width,
                    root_height
                ],center=true);

            translate([
                sign*neck_length/2,
                0,
                bottom+h/2
            ])
                cube([
                    eps,
                    neck_width,
                    h
                ],center=true);
        }

    translate([0,0,bottom+h/2])
        cube([
            neck_length+eps,
            neck_width,
            h
        ],center=true);
}

module tabs() {
    for(p=centers)
        translate([0,p[0],p[1]])
            connection();
}

module pair_model() {
    union() {
        bodies();
        tabs();
    }
}

module chain_model() {
    for(i=[0:chain_count-1])
        translate([
            (i-(chain_count-1)/2)*
            (pair_width+chain_gap),
            0,
            0
        ])
            pair_model();
}

module separated_model() {
    color("#e9a480")
        translate([inspection_spacing/2,0,0])
            first_tile();

    color("#7fa7b6")
        translate([-inspection_spacing/2,0,0])
            partner_tile();
}

module upright() {
    translate([0,0,AP])
        children();
}

module release_sample(h) {
    // A cropped section of the actual lower rim,
    // flange, cavity and visible front skin.
    // One join at a layer-aligned height.
    sample_join_z =
        first_layer_height+
        round(2/layer_height)*layer_height;

    union() {
        intersection() {
            upright()
                bodies();

            translate([
                -pair_width/2-eps,
                -sample_width/2,
                0
            ])
                cube([
                    pair_width+2*eps,
                    sample_width,
                    sample_height
                ]);
        }

        translate([
            0,
            0,
            sample_join_z+root_height/2
        ])
            connection(h);
    }
}

module release_test_plate() {
    // Left to right: one-, two-, three-layer necks.
    for(i=[0:2])
        translate([
            (i-1)*(pair_width+sample_spacing),
            0,
            0
        ])
            release_sample((i+1)*layer_height);
}

/* Output selection */

if(output=="flat")
    tile();

else if(output=="release_test")
    release_test_plate();

else
    upright() {
        if(output=="pair")
            pair_model();

        else if(output=="chain")
            chain_model();

        else if(output=="wall")
            oriented_tile();

        else if(output=="separated")
            separated_model();

        else if(output=="tabs")
            tabs();

        else if(output=="section")
            intersection() {
                pair_model();

                translate([
                    -pair_width,
                    -0.5,
                    -2*AP
                ])
                    cube([
                        2*pair_width,
                        1,
                        4*AP
                    ]);
            }

        if(
            $preview &&
            show_markers &&
            output!="wall"
        )
            for(p=centers)
                %color("red")
                    translate([0,p[0],p[1]])
                        sphere(r=1,$fn=16);
    }
